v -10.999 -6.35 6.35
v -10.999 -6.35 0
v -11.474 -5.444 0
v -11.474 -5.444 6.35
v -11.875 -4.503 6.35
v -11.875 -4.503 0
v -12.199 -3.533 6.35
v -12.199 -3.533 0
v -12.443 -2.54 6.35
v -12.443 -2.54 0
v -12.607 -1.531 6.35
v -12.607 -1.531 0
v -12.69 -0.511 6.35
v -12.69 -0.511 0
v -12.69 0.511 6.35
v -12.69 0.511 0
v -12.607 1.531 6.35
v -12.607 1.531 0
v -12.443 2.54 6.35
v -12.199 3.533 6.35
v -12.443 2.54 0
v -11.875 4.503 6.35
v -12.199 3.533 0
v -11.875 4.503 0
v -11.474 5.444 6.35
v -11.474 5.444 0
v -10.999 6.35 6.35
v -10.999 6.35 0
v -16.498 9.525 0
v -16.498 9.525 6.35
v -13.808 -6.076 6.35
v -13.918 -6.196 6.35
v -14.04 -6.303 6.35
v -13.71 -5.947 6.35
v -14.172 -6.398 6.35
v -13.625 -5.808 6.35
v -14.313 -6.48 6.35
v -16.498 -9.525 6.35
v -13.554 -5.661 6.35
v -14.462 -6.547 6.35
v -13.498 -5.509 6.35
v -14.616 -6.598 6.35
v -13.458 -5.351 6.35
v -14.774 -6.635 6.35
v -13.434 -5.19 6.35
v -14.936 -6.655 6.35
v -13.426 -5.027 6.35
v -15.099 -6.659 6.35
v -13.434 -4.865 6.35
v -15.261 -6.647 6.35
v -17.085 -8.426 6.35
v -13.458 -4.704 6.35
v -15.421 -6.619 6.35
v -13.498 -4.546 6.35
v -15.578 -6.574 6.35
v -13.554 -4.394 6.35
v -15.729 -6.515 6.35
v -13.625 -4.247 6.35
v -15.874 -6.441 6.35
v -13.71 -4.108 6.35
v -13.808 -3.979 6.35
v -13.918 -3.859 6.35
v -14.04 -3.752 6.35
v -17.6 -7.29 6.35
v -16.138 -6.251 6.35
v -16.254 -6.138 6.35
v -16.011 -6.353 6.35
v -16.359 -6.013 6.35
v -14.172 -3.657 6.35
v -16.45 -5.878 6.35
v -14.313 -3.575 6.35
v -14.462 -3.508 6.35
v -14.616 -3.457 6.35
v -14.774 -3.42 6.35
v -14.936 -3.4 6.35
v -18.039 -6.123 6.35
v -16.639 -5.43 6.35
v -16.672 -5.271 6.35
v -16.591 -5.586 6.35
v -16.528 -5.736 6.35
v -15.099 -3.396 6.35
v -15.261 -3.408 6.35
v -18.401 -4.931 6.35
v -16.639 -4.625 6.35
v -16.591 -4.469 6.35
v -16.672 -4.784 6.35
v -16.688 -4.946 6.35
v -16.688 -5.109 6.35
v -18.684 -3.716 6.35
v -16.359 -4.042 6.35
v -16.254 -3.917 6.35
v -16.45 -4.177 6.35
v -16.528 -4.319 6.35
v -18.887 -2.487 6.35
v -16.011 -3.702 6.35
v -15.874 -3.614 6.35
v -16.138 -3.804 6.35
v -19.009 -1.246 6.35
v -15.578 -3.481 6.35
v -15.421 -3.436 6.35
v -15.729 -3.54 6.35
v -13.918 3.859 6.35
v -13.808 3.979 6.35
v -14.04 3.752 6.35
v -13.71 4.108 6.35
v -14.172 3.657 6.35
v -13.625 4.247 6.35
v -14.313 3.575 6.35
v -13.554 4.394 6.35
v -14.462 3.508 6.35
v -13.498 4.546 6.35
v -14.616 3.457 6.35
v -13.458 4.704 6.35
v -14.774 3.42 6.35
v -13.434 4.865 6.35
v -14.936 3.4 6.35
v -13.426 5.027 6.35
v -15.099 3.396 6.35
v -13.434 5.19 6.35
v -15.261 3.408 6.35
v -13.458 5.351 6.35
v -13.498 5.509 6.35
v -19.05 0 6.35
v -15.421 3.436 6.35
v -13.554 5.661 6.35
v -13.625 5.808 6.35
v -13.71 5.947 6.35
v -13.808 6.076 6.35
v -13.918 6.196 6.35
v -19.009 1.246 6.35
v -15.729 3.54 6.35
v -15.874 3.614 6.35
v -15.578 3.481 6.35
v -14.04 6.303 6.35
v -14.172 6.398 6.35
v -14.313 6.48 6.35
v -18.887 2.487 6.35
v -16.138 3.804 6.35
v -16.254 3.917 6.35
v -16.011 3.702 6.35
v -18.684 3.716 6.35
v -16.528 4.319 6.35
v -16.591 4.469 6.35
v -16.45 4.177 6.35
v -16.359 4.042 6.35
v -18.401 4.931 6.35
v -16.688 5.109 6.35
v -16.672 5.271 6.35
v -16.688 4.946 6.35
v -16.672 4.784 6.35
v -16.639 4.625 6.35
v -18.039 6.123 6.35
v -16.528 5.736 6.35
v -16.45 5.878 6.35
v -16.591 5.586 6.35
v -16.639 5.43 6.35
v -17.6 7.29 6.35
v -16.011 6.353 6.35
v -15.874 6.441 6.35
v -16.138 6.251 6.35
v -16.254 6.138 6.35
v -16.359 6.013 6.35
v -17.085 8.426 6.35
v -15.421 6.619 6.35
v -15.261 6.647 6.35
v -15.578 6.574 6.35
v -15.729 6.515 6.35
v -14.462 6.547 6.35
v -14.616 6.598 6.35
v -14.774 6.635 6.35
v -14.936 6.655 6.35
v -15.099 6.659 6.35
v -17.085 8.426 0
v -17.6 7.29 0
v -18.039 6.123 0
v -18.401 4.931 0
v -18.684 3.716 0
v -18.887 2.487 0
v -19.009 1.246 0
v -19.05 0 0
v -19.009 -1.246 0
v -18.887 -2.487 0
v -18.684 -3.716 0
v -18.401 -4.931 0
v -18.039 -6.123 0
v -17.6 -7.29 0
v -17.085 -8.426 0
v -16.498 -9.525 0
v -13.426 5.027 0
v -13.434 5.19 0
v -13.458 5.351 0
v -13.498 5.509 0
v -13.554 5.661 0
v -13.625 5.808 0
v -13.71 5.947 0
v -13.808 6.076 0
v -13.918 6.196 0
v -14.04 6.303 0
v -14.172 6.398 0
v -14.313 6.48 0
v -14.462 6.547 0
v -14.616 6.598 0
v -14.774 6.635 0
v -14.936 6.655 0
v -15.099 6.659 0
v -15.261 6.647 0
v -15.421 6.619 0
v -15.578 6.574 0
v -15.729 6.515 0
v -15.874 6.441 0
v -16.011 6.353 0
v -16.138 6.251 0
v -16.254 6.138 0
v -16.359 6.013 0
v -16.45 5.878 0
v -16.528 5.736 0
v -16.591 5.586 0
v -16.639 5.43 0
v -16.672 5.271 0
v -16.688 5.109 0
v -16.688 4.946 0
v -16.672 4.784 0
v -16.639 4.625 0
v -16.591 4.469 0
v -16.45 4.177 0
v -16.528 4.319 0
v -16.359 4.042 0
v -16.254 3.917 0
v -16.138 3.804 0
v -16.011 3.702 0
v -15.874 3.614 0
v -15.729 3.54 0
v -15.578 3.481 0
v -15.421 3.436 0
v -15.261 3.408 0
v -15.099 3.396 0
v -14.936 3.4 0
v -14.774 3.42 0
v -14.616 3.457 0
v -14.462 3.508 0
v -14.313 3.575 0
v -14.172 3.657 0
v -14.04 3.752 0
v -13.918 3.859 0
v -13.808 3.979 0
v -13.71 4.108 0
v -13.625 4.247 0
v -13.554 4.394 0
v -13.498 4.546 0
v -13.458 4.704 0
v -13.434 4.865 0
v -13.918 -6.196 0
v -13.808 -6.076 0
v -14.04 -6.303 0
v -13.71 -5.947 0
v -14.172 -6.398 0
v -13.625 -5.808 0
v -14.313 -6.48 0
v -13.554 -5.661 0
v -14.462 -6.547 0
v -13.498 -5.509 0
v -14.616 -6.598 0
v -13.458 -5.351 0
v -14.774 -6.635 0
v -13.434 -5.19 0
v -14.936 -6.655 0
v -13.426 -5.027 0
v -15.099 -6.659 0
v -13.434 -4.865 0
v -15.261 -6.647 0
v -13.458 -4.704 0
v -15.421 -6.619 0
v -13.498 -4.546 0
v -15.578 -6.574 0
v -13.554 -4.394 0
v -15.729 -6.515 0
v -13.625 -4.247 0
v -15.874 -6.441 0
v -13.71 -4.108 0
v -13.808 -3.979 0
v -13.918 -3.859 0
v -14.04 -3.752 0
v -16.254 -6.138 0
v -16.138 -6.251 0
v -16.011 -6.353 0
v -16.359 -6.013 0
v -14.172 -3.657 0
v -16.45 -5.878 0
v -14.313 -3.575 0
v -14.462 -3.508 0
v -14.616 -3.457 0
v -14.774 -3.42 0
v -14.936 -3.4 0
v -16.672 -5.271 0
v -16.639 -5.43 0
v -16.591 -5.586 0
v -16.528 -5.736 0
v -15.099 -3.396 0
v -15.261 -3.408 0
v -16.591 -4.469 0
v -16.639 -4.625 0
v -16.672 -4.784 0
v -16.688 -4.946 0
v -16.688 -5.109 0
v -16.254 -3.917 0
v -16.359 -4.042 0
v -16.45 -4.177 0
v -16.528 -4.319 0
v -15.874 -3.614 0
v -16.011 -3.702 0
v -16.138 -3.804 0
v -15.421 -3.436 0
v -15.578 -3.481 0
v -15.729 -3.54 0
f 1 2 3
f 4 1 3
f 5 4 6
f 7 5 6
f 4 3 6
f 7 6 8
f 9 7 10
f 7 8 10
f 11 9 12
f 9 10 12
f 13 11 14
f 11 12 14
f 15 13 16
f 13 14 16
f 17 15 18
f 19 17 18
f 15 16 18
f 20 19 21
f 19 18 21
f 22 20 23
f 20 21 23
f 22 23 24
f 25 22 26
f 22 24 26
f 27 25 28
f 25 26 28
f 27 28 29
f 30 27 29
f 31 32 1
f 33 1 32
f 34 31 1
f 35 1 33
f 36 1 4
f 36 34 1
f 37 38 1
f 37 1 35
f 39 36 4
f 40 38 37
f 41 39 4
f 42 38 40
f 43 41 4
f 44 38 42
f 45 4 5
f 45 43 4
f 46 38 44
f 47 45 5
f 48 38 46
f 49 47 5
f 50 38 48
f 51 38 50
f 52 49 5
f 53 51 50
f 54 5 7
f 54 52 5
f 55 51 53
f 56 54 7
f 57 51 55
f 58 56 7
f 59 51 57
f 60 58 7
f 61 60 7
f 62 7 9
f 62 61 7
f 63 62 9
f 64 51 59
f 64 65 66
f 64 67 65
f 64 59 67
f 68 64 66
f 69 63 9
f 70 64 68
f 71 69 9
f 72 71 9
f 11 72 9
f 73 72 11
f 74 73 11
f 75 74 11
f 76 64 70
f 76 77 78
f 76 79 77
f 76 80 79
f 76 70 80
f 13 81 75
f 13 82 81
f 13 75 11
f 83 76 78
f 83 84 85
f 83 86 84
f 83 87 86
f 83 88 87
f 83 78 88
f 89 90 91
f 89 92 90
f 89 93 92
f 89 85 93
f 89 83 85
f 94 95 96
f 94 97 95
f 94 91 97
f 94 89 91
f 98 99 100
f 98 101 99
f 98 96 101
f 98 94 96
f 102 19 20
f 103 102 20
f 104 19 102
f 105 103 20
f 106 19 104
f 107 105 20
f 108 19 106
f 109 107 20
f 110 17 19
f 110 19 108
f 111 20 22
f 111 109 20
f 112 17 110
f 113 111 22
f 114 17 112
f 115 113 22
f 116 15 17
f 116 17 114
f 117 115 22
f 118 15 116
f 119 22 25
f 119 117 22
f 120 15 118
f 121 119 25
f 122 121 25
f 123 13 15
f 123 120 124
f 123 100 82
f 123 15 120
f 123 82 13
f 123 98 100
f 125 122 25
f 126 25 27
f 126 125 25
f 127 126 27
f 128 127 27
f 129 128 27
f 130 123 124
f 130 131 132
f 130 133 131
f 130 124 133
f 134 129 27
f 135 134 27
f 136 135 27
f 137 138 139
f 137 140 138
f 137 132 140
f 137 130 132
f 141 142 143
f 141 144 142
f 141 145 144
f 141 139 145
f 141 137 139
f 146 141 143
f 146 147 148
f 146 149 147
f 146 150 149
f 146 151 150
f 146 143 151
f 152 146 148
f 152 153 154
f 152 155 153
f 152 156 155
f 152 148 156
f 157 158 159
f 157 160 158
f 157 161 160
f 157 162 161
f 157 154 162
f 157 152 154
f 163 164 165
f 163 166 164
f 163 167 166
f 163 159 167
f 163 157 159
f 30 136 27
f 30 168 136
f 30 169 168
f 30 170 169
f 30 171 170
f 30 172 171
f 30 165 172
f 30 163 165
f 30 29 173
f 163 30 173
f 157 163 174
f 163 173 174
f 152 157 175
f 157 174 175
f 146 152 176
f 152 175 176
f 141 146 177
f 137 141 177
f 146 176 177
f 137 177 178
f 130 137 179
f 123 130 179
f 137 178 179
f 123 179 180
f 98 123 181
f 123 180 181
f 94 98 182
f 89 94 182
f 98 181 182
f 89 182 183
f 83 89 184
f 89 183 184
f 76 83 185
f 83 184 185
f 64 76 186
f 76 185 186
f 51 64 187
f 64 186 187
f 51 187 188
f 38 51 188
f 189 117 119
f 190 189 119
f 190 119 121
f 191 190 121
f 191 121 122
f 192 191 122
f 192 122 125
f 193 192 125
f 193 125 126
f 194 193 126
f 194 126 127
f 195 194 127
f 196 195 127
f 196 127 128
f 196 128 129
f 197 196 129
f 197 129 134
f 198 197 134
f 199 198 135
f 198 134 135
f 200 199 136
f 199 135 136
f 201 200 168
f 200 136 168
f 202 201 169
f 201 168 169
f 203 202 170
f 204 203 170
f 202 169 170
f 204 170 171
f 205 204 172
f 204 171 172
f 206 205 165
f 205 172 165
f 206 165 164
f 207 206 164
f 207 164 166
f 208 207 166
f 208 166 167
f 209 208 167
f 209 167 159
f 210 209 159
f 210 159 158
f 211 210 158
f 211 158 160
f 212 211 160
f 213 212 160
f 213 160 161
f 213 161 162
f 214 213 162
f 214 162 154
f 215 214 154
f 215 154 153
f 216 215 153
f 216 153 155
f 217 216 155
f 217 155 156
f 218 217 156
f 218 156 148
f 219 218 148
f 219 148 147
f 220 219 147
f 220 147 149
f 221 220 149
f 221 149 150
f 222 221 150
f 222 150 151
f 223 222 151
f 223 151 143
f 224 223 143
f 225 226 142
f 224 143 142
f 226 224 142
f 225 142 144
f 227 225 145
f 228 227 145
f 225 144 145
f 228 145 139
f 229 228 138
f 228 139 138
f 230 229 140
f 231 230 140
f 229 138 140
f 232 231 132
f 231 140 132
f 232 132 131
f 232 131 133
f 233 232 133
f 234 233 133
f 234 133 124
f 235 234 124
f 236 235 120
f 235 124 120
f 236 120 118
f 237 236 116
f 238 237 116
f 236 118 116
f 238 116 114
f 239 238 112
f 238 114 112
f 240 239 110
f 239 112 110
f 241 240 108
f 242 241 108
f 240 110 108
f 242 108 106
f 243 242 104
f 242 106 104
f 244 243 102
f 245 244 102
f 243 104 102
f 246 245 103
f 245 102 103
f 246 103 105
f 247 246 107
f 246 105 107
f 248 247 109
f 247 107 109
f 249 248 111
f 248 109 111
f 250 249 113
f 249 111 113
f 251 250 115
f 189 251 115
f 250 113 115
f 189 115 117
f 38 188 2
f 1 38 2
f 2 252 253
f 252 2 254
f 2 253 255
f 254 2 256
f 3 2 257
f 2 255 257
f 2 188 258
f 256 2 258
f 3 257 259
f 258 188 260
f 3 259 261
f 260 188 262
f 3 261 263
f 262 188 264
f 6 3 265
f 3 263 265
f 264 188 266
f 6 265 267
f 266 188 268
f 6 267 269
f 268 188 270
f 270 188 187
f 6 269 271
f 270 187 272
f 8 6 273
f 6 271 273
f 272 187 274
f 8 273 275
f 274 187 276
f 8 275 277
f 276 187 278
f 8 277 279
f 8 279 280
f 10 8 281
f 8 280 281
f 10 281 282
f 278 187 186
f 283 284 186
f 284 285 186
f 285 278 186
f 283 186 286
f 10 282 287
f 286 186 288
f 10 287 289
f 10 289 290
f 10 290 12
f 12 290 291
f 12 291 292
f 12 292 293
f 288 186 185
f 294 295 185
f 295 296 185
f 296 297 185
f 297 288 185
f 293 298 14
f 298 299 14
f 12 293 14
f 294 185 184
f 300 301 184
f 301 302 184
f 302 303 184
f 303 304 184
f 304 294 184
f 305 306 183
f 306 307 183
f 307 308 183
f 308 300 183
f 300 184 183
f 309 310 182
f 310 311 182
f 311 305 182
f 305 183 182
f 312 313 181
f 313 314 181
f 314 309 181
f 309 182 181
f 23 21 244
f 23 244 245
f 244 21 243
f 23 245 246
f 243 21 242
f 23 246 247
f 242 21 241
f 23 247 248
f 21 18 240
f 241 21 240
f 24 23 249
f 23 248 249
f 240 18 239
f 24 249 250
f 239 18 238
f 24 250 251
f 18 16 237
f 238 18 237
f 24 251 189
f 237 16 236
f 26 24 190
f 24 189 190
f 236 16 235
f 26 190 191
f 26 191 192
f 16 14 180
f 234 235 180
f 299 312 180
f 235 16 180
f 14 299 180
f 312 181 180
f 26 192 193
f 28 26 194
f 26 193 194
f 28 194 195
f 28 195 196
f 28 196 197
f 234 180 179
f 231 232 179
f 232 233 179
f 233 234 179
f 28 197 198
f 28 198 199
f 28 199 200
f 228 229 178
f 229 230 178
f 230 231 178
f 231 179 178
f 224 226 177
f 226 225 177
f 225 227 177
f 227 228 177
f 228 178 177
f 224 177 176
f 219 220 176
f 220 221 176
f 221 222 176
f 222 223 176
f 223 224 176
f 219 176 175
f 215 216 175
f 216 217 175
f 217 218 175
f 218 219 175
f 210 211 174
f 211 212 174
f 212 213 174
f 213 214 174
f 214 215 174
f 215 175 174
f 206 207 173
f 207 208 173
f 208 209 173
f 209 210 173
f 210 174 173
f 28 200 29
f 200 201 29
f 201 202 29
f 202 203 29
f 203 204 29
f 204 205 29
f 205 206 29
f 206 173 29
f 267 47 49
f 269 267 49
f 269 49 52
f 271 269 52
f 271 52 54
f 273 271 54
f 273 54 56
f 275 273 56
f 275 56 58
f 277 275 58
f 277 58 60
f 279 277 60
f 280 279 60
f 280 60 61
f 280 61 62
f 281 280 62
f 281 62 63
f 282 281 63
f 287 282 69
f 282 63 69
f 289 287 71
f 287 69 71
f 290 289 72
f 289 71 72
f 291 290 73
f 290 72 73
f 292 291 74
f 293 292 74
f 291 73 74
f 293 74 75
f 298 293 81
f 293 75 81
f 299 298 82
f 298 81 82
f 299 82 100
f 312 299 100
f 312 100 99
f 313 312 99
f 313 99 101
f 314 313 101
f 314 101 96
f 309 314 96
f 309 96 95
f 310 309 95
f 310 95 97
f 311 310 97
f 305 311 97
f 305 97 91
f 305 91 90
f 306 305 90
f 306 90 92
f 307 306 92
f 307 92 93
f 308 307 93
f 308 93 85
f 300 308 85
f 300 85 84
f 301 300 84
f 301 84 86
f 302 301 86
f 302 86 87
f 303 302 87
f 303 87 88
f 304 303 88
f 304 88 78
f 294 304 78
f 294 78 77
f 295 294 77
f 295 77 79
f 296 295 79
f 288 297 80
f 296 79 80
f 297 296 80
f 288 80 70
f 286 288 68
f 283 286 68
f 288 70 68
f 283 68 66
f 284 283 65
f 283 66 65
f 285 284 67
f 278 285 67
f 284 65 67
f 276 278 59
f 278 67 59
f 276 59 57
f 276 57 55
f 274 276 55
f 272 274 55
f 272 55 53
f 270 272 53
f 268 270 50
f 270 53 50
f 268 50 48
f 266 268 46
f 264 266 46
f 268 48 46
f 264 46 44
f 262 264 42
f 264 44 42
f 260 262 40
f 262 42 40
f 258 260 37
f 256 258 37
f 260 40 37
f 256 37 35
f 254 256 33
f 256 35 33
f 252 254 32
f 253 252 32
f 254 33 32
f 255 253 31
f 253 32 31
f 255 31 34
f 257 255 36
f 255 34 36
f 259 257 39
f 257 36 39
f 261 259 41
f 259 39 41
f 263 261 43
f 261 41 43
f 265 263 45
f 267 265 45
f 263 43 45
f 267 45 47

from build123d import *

# Parameters (mm, degrees)
BOSS_EXTRUDE1_DEPTH = 6.35
CUT_EXTRUDE1_REACH  = 8.35
SKETCH2_R           = 1.63195


with BuildPart() as part:
    # Sketch1 → Boss-Extrude1 (new body)
    with BuildSketch(Plane(origin=(0, 0, 0), x_dir=(0, 1, 0), z_dir=(0, 0, 1))):
        with BuildLine():
            Line((-9.525, 16.497783942), (-6.35, 10.998522628))
            ThreePointArc((-6.35, 10.998522628), (0, 12.7), (6.35, 10.998522628))
            Line((6.35, 10.998522628), (9.525, 16.497783942))
            ThreePointArc((9.525, 16.497783942), (0, 19.05), (-9.525, 16.497783942))
        make_face()
    extrude(amount=BOSS_EXTRUDE1_DEPTH)

    # Sketch2 → Cut-Extrude1 (cut, up to next)
    with BuildSketch(Plane.XY.offset(6.35), mode=Mode.PRIVATE) as cut_extrude1_sk1:
        with Locations((-15.057884182, 5.027499276)):
            Circle(SKETCH2_R)
    cut_extrude1_tool1 = extrude(cut_extrude1_sk1.sketch, amount=-CUT_EXTRUDE1_REACH, mode=Mode.PRIVATE) & part.part
    add(cut_extrude1_tool1.solids().sort_by_distance((-15.057884, 5.027499, 6.35))[0], mode=Mode.SUBTRACT)
    # Sketch2 → Cut-Extrude1 (cut, up to next)
    with BuildSketch(Plane.XY.offset(6.35), mode=Mode.PRIVATE) as cut_extrude1_sk2:
        with Locations((-15.057884182, -5.027499276)):
            Circle(SKETCH2_R)
    cut_extrude1_tool2 = extrude(cut_extrude1_sk2.sketch, amount=-CUT_EXTRUDE1_REACH, mode=Mode.PRIVATE) & part.part
    add(cut_extrude1_tool2.solids().sort_by_distance((-15.057884, -5.027499, 6.35))[0], mode=Mode.SUBTRACT)


solid = part.part
